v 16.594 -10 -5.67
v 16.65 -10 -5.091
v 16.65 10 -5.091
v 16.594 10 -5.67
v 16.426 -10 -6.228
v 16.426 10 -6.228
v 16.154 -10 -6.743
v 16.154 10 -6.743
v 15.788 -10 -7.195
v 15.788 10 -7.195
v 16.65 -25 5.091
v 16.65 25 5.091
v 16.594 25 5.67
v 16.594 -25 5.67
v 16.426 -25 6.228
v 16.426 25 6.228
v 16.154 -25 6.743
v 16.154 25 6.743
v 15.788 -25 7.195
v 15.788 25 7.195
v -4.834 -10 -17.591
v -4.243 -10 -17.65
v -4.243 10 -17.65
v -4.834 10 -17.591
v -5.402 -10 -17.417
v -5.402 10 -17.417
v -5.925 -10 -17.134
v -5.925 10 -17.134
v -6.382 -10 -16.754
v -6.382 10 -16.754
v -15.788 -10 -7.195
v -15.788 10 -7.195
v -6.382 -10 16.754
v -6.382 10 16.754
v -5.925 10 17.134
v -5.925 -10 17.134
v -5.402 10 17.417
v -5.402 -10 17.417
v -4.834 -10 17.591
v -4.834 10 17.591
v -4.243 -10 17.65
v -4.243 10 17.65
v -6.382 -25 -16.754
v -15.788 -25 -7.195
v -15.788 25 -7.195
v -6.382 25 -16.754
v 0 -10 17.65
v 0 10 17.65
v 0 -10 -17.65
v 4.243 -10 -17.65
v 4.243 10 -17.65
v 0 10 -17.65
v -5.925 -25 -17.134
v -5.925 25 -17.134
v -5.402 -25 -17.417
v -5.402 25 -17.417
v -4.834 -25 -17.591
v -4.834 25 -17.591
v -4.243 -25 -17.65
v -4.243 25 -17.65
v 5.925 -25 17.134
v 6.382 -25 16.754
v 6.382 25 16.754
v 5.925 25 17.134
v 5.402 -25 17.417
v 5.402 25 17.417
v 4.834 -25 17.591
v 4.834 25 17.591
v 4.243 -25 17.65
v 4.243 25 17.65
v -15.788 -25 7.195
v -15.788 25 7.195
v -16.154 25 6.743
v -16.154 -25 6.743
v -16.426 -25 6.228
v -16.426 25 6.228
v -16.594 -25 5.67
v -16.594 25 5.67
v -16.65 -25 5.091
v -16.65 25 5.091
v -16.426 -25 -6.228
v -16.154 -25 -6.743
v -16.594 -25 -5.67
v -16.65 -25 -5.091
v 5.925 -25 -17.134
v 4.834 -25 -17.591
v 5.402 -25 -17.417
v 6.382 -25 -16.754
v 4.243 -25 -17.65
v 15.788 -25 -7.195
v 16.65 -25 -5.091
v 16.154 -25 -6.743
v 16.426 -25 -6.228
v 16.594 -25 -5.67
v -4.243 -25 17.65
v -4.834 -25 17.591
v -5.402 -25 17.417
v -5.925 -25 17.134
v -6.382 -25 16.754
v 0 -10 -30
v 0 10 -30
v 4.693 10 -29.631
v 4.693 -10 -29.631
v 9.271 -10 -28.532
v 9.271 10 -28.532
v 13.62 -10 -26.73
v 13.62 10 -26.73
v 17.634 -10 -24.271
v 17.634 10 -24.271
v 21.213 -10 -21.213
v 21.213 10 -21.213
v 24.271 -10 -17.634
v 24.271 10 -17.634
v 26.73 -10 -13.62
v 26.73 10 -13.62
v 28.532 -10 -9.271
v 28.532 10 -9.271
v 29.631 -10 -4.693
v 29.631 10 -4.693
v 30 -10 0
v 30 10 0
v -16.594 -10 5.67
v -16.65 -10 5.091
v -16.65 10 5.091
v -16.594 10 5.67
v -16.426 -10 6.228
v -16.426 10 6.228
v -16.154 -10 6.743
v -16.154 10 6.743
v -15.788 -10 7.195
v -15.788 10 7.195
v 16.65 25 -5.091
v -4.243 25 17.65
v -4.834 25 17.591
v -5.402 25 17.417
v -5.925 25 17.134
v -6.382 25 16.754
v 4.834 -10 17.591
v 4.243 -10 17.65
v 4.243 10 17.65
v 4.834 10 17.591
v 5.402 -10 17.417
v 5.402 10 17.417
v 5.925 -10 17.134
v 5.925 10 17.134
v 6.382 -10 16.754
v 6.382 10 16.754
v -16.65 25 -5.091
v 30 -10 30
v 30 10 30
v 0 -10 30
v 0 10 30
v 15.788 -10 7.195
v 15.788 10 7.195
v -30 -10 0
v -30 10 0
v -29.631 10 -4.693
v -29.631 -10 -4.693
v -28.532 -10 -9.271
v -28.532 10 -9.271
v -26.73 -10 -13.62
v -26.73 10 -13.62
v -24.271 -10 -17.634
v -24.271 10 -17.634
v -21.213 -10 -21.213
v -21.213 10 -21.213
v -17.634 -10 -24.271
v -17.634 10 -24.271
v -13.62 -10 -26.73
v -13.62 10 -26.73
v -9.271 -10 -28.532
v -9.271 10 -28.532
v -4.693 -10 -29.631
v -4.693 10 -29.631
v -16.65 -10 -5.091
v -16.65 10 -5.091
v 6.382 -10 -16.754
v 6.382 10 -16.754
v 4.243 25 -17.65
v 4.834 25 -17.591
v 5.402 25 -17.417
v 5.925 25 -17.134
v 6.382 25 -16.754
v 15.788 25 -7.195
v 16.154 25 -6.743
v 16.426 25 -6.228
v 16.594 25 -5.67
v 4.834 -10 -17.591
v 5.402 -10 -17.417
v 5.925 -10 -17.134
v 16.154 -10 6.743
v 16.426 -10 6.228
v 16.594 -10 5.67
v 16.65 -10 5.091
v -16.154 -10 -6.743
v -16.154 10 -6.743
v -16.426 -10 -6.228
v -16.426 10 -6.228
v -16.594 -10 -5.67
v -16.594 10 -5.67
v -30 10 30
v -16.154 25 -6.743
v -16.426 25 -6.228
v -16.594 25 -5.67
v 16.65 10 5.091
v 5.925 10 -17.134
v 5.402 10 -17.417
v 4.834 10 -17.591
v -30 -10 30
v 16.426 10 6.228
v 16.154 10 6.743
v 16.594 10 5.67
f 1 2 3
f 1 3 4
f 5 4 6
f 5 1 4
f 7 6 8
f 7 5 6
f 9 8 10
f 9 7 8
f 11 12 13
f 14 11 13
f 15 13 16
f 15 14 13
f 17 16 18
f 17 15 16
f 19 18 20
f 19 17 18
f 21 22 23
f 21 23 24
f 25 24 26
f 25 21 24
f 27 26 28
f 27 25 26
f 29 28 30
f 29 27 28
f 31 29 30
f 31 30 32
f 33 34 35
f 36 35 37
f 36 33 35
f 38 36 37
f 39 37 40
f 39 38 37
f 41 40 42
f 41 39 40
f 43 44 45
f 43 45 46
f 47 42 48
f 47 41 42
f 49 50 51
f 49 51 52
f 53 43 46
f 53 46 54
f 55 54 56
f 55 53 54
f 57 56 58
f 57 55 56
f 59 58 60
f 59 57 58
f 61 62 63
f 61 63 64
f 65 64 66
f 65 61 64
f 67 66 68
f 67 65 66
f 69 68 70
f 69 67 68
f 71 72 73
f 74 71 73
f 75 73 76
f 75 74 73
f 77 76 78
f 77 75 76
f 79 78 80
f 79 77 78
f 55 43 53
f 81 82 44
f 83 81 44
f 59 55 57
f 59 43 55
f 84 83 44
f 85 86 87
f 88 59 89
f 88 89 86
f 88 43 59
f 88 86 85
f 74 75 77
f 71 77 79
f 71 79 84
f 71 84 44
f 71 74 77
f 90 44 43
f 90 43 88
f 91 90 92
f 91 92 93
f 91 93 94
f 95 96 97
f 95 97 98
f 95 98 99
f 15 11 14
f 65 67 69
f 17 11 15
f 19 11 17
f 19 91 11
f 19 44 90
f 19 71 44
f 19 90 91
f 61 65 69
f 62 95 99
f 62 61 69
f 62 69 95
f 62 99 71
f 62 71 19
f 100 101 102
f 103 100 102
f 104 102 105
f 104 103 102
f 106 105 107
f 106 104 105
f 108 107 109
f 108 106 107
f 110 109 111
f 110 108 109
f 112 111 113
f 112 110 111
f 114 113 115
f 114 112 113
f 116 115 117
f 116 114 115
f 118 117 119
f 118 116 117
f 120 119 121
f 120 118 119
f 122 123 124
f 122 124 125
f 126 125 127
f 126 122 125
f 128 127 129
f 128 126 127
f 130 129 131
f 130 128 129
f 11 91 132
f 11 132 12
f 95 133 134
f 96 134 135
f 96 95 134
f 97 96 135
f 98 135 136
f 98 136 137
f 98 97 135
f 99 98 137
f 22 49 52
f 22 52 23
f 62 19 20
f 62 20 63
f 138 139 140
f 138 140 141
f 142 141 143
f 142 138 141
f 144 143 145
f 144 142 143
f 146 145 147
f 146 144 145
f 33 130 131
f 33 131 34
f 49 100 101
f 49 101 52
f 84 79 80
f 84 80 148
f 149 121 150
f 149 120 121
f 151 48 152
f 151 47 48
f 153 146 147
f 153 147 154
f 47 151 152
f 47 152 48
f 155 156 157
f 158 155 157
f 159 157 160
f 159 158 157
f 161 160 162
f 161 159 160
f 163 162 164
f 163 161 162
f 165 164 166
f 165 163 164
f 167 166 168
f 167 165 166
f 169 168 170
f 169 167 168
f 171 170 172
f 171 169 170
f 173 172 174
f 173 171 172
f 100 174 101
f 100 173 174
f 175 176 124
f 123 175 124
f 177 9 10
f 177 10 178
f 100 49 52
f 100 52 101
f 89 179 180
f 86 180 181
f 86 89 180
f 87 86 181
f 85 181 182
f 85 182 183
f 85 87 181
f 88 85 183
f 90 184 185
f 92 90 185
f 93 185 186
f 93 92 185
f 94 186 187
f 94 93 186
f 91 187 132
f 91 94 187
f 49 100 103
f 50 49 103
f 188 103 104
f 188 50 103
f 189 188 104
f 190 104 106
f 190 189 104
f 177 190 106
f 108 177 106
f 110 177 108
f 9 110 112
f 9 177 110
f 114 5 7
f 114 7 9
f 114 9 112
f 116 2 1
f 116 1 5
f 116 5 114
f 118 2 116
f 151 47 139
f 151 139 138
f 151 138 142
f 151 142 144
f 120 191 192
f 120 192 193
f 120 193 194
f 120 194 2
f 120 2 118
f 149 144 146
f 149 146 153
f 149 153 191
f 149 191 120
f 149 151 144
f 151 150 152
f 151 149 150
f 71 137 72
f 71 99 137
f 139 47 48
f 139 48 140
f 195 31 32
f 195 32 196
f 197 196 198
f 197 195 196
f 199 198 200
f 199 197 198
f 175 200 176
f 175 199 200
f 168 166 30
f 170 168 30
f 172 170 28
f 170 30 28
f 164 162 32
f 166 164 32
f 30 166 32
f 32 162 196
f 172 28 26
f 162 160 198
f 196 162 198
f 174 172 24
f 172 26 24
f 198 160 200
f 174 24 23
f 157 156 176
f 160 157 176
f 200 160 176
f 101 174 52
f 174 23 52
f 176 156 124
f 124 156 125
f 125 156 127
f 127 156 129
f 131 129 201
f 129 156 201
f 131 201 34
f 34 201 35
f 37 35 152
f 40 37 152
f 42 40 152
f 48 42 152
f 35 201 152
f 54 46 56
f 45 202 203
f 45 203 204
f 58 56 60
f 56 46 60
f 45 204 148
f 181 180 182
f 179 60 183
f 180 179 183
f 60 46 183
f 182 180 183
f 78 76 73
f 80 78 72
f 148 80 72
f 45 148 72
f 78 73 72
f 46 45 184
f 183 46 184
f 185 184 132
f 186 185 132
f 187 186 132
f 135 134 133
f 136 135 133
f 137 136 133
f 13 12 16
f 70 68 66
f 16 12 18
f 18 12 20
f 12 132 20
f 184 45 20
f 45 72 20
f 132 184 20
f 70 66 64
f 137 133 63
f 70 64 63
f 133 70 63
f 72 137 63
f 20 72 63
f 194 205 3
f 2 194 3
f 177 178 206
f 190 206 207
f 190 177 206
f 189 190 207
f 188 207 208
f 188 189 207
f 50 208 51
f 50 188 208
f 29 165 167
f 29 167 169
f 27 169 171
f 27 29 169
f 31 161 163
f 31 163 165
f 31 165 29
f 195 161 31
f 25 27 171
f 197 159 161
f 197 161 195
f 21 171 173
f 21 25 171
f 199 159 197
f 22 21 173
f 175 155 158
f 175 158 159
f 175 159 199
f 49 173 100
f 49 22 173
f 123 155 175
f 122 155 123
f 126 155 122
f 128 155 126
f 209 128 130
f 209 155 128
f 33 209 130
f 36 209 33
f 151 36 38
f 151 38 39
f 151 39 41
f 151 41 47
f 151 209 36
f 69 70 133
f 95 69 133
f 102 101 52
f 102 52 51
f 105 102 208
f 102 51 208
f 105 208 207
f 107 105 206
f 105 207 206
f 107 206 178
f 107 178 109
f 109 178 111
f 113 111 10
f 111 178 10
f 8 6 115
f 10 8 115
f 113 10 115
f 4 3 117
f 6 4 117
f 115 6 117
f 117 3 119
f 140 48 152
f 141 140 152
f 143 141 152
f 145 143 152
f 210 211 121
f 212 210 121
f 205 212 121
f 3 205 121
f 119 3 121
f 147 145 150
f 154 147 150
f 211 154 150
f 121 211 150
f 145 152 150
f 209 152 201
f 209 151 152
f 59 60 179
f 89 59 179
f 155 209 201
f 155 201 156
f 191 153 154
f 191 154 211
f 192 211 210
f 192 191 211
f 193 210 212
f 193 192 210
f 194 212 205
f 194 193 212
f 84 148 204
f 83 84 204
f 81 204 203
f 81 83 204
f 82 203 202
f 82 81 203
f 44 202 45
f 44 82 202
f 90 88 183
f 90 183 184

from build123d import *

# Parameters (mm, degrees)
F1_DEPTH      = 25
F1_DEPTH_BACK = 25
F2_DEPTH      = 10
F2_DEPTH_BACK = 10
F3_DEPTH      = 10
F3_DEPTH_BACK = 10


with BuildPart() as f1:
    # F0 (on Front) → F1 (new body, two sides)
    with BuildSketch(Plane.XZ) as f1_sk:
        with BuildLine():
            ThreePointArc((-15.788288, 7.195126), (-16.426226, 6.227822), (-16.65, 5.09091))
            Line((-16.65, 5.09091), (-16.65, -5.09091))
            ThreePointArc((-16.65, -5.09091), (-16.426226, -6.227822), (-15.788288, -7.195126))
            Line((-15.788288, -7.195126), (-6.38151, -16.754216))
            ThreePointArc((-6.38151, -16.754216), (-5.402393, -17.417006), (-4.243223, -17.65))
            Line((-4.243223, -17.65), (0, -17.65))
            Line((0, -17.65), (4.243223, -17.65))
            ThreePointArc((4.243223, -17.65), (5.402393, -17.417006), (6.38151, -16.754216))
            Line((6.38151, -16.754216), (15.788288, -7.195126))
            ThreePointArc((15.788288, -7.195126), (16.426226, -6.227822), (16.65, -5.09091))
            Line((16.65, -5.09091), (16.65, 5.09091))
            ThreePointArc((16.65, 5.09091), (16.426226, 6.227822), (15.788288, 7.195126))
            Line((15.788288, 7.195126), (6.38151, 16.754216))
            ThreePointArc((6.38151, 16.754216), (5.402393, 17.417006), (4.243223, 17.65))
            Line((4.243223, 17.65), (0, 17.65))
            Line((0, 17.65), (-4.243223, 17.65))
            ThreePointArc((-4.243223, 17.65), (-5.402393, 17.417006), (-6.38151, 16.754216))
            Line((-6.38151, 16.754216), (-15.788288, 7.195126))
        make_face()
    extrude(amount=F1_DEPTH)
    extrude(f1_sk.sketch, amount=-F1_DEPTH_BACK)


with BuildPart() as f2:
    # F0 (on Front) → F2 (new body, two sides)
    with BuildSketch(Plane.XZ) as f2_sk:
        with BuildLine():
            ThreePointArc((-30, 0), (-21.213203, 21.213203), (0, 30))
            Line((0, 30), (-30, 30))
            Line((-30, 30), (-30, 0))
        make_face()
        with BuildLine():
            Line((-16.65, -5.09091), (-16.65, 5.09091))
            ThreePointArc((-16.65, 5.09091), (-16.426226, 6.227822), (-15.788288, 7.195126))
            Line((-15.788288, 7.195126), (-6.38151, 16.754216))
            ThreePointArc((-6.38151, 16.754216), (-5.402393, 17.417006), (-4.243223, 17.65))
            Line((-4.243223, 17.65), (0, 17.65))
            Line((0, 17.65), (0, 30))
            ThreePointArc((0, 30), (-21.213203, 21.213203), (-30, 0))
            ThreePointArc((-30, 0), (-21.213203, -21.213203), (0, -30))
            Line((0, -30), (0, -17.65))
            Line((0, -17.65), (-4.243223, -17.65))
            ThreePointArc((-4.243223, -17.65), (-5.402393, -17.417006), (-6.38151, -16.754216))
            Line((-6.38151, -16.754216), (-15.788288, -7.195126))
            ThreePointArc((-15.788288, -7.195126), (-16.426226, -6.227822), (-16.65, -5.09091))
        make_face()
    extrude(amount=F2_DEPTH)
    extrude(f2_sk.sketch, amount=-F2_DEPTH_BACK)


with BuildPart() as f3:
    # F0 (on Front) → F3 (new body, two sides)
    with BuildSketch(Plane.XZ) as f3_sk:
        with BuildLine():
            Line((30, 30), (0, 30))
            ThreePointArc((0, 30), (21.213203, 21.213203), (30, 0))
            Line((30, 0), (30, 30))
        make_face()
        with BuildLine():
            Line((0, 30), (0, 17.65))
            Line((0, 17.65), (4.243223, 17.65))
            ThreePointArc((4.243223, 17.65), (5.402393, 17.417006), (6.38151, 16.754216))
            Line((6.38151, 16.754216), (15.788288, 7.195126))
            ThreePointArc((15.788288, 7.195126), (16.426226, 6.227822), (16.65, 5.09091))
            Line((16.65, 5.09091), (16.65, -5.09091))
            ThreePointArc((16.65, -5.09091), (16.426226, -6.227822), (15.788288, -7.195126))
            Line((15.788288, -7.195126), (6.38151, -16.754216))
            ThreePointArc((6.38151, -16.754216), (5.402393, -17.417006), (4.243223, -17.65))
            Line((4.243223, -17.65), (0, -17.65))
            Line((0, -17.65), (0, -30))
            ThreePointArc((0, -30), (21.213203, -21.213203), (30, 0))
            ThreePointArc((30, 0), (21.213203, 21.213203), (0, 30))
        make_face()
    extrude(amount=F3_DEPTH)
    extrude(f3_sk.sketch, amount=-F3_DEPTH_BACK)


solid = Compound([f1.part, f2.part, f3.part])
